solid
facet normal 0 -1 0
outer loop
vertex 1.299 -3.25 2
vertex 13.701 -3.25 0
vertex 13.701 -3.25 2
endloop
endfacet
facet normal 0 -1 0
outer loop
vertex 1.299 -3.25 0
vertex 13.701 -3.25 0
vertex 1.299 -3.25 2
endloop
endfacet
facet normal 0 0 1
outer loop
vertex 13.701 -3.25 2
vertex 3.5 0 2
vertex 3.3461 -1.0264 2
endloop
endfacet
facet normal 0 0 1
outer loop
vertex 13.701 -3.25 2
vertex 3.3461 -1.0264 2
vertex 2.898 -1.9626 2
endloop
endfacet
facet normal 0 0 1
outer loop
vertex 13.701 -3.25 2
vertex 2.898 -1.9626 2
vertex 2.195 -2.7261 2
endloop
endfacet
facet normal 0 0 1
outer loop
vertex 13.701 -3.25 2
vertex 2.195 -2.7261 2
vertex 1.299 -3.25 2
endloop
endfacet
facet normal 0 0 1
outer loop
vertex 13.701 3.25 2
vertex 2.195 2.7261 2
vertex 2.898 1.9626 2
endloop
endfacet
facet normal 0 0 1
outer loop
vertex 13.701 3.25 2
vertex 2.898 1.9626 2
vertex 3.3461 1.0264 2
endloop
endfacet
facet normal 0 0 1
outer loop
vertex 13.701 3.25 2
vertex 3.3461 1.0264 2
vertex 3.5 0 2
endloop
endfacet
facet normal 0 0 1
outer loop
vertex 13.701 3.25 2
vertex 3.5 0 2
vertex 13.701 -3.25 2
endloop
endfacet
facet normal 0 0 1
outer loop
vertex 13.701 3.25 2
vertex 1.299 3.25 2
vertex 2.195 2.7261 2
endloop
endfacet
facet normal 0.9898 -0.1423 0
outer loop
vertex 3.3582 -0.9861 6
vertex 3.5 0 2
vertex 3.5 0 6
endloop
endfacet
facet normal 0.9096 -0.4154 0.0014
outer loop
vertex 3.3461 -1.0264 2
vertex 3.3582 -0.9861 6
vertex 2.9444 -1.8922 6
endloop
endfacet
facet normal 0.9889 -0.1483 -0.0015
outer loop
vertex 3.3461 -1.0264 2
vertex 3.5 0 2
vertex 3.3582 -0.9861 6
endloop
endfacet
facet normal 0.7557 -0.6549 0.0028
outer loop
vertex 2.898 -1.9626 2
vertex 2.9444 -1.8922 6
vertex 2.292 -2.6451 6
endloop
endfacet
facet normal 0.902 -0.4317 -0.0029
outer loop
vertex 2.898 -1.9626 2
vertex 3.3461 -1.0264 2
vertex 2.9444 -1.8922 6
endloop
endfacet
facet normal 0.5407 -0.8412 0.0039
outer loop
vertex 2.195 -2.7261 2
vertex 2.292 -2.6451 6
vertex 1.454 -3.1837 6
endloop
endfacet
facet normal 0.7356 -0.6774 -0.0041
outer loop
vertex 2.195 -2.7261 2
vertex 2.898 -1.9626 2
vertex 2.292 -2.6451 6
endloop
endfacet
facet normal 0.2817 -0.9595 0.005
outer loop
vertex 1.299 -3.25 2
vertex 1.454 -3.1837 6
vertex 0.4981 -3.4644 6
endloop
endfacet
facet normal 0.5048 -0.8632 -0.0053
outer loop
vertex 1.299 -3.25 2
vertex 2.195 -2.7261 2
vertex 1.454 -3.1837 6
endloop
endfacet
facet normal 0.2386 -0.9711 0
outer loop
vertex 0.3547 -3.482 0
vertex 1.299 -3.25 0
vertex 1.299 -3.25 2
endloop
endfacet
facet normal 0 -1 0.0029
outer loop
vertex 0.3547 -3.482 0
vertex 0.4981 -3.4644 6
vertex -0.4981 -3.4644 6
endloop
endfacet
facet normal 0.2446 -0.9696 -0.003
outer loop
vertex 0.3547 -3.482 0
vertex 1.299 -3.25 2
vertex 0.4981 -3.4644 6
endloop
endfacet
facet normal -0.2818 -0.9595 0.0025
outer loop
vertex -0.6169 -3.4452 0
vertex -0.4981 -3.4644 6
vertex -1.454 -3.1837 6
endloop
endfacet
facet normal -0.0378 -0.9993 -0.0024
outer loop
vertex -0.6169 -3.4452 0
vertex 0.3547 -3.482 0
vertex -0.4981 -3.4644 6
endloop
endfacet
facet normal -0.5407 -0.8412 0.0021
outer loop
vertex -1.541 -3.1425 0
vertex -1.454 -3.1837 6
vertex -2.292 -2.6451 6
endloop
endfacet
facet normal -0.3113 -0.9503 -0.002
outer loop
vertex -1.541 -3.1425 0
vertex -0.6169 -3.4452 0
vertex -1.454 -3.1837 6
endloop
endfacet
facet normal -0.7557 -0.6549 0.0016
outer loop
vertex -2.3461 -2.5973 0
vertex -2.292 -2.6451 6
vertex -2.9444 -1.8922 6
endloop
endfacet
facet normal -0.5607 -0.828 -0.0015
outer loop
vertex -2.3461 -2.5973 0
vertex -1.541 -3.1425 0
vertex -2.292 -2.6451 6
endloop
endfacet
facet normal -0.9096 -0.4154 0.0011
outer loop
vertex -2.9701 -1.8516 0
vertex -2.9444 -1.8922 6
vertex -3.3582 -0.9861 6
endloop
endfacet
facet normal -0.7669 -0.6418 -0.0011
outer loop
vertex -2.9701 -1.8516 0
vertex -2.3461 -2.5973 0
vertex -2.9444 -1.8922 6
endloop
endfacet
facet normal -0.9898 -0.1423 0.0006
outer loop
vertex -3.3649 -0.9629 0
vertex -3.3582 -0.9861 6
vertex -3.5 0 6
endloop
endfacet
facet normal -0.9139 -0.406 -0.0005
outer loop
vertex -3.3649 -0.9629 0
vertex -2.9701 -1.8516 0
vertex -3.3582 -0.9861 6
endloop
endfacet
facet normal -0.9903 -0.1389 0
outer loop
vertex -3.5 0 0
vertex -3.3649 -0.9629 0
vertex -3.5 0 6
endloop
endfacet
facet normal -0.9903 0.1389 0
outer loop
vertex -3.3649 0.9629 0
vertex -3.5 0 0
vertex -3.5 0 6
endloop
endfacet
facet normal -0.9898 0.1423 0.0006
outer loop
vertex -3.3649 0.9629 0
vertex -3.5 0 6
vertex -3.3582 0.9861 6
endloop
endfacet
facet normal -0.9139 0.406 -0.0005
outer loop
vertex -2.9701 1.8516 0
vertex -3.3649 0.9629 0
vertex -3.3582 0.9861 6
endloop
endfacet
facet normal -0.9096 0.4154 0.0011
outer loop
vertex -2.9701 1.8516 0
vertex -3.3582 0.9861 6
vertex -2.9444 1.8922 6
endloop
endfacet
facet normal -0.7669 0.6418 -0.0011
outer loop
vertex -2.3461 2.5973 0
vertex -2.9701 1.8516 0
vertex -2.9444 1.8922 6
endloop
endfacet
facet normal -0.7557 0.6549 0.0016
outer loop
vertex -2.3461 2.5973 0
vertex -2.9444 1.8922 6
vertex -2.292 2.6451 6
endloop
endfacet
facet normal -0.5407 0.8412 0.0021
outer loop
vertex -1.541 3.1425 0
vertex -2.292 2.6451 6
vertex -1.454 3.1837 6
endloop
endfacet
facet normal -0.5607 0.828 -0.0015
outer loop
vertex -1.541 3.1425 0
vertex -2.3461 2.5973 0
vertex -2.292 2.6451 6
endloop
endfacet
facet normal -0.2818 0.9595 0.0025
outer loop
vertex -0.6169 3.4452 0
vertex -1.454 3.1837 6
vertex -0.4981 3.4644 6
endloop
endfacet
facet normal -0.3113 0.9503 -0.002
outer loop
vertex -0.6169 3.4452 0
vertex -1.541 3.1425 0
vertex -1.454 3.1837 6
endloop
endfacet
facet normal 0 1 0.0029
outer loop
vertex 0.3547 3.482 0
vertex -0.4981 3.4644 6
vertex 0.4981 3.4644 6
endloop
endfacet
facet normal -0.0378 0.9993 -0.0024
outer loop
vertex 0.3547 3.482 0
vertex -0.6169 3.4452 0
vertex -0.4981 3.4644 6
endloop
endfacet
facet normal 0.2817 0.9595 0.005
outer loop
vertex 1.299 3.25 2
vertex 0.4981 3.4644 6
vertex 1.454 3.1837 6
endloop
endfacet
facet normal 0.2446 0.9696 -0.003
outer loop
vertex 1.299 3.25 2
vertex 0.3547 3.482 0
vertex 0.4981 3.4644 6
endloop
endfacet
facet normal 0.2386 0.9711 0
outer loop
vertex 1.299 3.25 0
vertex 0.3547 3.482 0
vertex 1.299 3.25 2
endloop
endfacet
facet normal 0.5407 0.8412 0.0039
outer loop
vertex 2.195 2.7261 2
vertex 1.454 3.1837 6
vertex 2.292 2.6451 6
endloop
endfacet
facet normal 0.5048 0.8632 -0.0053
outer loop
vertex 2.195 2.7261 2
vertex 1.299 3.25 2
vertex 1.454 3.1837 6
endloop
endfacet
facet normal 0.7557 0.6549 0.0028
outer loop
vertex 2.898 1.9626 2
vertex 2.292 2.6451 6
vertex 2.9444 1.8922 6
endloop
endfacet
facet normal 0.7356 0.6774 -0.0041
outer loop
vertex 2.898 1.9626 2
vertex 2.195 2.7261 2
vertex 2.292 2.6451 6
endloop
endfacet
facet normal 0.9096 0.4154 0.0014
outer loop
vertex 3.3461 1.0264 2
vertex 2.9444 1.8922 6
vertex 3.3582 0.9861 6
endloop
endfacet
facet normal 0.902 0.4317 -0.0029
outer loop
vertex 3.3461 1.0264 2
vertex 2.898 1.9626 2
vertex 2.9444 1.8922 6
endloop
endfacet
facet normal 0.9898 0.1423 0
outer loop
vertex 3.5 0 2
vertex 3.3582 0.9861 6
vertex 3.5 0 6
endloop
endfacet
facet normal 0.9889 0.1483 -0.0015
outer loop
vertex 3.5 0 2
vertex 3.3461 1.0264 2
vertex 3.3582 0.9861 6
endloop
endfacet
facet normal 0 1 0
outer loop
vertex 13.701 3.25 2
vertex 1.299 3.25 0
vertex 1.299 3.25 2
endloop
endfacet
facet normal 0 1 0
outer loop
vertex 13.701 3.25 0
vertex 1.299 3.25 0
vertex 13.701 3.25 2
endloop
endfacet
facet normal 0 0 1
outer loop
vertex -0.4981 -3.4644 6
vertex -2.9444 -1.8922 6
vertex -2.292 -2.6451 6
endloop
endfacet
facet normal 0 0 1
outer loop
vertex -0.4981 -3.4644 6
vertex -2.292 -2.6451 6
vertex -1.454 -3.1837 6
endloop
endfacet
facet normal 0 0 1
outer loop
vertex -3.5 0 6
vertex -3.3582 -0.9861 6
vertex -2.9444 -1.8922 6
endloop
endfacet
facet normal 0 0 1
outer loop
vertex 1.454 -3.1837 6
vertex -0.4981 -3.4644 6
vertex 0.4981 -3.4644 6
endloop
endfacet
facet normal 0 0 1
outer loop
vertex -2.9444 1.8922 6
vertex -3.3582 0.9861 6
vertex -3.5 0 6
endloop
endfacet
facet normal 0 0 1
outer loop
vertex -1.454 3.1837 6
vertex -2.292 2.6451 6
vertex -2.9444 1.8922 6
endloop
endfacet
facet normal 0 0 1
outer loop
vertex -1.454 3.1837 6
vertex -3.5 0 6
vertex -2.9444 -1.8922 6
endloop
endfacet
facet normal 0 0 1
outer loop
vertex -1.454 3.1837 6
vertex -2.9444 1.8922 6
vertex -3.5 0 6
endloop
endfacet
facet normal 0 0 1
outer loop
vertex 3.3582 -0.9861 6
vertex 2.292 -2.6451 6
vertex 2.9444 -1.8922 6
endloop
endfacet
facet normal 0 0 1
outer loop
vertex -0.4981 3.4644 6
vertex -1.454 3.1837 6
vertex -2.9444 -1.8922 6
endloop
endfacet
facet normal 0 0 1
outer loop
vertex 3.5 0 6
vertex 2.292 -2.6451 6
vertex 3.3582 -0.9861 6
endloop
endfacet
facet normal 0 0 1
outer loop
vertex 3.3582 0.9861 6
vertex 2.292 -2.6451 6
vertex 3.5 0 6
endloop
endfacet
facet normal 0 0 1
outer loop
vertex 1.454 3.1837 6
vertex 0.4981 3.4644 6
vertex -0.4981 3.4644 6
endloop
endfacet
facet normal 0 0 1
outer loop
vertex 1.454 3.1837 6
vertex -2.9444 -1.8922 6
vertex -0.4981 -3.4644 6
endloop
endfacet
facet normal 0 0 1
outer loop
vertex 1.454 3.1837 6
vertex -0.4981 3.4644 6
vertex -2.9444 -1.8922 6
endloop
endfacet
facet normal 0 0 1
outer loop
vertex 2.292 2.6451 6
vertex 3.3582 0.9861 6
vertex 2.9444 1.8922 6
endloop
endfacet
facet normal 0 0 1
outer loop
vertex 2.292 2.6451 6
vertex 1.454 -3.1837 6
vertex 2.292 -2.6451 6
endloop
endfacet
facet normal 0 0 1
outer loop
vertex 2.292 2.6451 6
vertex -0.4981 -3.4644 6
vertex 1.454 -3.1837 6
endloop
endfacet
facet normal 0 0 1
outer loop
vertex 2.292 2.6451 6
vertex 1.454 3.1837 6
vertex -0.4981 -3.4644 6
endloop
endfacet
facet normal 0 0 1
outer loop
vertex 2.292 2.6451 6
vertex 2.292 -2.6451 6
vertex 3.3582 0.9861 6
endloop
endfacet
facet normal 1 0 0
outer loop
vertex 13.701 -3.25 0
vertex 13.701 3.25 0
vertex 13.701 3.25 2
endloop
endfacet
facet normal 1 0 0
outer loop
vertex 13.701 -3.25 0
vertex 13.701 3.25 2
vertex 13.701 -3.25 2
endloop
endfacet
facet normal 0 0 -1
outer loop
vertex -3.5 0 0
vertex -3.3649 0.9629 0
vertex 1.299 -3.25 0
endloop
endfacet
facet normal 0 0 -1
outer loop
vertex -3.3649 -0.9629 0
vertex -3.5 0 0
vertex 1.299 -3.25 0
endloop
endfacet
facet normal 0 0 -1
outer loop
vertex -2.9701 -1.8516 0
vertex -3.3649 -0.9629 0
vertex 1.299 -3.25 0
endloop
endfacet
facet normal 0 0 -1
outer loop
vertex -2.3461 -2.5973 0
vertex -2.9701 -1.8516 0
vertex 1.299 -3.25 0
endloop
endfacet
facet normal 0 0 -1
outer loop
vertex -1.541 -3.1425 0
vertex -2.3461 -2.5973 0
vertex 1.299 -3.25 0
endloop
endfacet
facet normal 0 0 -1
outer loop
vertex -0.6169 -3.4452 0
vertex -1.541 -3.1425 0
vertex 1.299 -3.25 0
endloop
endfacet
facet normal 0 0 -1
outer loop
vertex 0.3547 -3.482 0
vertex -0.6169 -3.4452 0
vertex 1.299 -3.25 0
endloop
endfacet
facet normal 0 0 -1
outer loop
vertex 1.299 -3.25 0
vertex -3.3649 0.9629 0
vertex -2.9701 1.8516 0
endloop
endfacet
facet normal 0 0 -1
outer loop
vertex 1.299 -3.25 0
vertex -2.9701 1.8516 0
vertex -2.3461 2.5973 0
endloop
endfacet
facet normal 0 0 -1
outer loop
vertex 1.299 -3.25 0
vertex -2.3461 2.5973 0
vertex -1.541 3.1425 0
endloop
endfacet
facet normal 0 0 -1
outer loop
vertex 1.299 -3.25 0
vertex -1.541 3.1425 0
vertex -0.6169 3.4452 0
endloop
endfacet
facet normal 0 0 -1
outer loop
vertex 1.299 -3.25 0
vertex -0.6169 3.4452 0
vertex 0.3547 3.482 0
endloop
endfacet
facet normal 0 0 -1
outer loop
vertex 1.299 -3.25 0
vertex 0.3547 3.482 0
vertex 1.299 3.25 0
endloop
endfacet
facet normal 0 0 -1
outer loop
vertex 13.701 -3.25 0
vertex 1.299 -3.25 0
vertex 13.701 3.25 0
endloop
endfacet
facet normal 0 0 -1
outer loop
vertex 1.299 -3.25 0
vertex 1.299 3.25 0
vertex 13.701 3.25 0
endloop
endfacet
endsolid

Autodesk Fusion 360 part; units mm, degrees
sketch "Sketch1" plane through (0, 0, 0) normal (0, 0, 1) x (1, 0, 0)
  circle A0 centre (0, 0) radius 3.5
  dimension "d1" = 7
extrude "Extrude1" add sketch "Sketch1" along normal blind 6
sketch "Sketch2" plane through (0, 0, 0) normal (0, 0, 1) x (1, 0, 0)
  line L0 (0, 3.25) -> (13.701, 3.25)
  line L1 (13.701, 3.25) -> (13.701, -3.25)
  line L2 (13.701, -3.25) -> (0, -3.25)
  line L3 (0, -3.25) -> (0, 3.25)
  dimension "d4" = 6.5
  dimension "d5" = 13.701
extrude "Extrude2" add sketch "Sketch2" along normal blind 2
